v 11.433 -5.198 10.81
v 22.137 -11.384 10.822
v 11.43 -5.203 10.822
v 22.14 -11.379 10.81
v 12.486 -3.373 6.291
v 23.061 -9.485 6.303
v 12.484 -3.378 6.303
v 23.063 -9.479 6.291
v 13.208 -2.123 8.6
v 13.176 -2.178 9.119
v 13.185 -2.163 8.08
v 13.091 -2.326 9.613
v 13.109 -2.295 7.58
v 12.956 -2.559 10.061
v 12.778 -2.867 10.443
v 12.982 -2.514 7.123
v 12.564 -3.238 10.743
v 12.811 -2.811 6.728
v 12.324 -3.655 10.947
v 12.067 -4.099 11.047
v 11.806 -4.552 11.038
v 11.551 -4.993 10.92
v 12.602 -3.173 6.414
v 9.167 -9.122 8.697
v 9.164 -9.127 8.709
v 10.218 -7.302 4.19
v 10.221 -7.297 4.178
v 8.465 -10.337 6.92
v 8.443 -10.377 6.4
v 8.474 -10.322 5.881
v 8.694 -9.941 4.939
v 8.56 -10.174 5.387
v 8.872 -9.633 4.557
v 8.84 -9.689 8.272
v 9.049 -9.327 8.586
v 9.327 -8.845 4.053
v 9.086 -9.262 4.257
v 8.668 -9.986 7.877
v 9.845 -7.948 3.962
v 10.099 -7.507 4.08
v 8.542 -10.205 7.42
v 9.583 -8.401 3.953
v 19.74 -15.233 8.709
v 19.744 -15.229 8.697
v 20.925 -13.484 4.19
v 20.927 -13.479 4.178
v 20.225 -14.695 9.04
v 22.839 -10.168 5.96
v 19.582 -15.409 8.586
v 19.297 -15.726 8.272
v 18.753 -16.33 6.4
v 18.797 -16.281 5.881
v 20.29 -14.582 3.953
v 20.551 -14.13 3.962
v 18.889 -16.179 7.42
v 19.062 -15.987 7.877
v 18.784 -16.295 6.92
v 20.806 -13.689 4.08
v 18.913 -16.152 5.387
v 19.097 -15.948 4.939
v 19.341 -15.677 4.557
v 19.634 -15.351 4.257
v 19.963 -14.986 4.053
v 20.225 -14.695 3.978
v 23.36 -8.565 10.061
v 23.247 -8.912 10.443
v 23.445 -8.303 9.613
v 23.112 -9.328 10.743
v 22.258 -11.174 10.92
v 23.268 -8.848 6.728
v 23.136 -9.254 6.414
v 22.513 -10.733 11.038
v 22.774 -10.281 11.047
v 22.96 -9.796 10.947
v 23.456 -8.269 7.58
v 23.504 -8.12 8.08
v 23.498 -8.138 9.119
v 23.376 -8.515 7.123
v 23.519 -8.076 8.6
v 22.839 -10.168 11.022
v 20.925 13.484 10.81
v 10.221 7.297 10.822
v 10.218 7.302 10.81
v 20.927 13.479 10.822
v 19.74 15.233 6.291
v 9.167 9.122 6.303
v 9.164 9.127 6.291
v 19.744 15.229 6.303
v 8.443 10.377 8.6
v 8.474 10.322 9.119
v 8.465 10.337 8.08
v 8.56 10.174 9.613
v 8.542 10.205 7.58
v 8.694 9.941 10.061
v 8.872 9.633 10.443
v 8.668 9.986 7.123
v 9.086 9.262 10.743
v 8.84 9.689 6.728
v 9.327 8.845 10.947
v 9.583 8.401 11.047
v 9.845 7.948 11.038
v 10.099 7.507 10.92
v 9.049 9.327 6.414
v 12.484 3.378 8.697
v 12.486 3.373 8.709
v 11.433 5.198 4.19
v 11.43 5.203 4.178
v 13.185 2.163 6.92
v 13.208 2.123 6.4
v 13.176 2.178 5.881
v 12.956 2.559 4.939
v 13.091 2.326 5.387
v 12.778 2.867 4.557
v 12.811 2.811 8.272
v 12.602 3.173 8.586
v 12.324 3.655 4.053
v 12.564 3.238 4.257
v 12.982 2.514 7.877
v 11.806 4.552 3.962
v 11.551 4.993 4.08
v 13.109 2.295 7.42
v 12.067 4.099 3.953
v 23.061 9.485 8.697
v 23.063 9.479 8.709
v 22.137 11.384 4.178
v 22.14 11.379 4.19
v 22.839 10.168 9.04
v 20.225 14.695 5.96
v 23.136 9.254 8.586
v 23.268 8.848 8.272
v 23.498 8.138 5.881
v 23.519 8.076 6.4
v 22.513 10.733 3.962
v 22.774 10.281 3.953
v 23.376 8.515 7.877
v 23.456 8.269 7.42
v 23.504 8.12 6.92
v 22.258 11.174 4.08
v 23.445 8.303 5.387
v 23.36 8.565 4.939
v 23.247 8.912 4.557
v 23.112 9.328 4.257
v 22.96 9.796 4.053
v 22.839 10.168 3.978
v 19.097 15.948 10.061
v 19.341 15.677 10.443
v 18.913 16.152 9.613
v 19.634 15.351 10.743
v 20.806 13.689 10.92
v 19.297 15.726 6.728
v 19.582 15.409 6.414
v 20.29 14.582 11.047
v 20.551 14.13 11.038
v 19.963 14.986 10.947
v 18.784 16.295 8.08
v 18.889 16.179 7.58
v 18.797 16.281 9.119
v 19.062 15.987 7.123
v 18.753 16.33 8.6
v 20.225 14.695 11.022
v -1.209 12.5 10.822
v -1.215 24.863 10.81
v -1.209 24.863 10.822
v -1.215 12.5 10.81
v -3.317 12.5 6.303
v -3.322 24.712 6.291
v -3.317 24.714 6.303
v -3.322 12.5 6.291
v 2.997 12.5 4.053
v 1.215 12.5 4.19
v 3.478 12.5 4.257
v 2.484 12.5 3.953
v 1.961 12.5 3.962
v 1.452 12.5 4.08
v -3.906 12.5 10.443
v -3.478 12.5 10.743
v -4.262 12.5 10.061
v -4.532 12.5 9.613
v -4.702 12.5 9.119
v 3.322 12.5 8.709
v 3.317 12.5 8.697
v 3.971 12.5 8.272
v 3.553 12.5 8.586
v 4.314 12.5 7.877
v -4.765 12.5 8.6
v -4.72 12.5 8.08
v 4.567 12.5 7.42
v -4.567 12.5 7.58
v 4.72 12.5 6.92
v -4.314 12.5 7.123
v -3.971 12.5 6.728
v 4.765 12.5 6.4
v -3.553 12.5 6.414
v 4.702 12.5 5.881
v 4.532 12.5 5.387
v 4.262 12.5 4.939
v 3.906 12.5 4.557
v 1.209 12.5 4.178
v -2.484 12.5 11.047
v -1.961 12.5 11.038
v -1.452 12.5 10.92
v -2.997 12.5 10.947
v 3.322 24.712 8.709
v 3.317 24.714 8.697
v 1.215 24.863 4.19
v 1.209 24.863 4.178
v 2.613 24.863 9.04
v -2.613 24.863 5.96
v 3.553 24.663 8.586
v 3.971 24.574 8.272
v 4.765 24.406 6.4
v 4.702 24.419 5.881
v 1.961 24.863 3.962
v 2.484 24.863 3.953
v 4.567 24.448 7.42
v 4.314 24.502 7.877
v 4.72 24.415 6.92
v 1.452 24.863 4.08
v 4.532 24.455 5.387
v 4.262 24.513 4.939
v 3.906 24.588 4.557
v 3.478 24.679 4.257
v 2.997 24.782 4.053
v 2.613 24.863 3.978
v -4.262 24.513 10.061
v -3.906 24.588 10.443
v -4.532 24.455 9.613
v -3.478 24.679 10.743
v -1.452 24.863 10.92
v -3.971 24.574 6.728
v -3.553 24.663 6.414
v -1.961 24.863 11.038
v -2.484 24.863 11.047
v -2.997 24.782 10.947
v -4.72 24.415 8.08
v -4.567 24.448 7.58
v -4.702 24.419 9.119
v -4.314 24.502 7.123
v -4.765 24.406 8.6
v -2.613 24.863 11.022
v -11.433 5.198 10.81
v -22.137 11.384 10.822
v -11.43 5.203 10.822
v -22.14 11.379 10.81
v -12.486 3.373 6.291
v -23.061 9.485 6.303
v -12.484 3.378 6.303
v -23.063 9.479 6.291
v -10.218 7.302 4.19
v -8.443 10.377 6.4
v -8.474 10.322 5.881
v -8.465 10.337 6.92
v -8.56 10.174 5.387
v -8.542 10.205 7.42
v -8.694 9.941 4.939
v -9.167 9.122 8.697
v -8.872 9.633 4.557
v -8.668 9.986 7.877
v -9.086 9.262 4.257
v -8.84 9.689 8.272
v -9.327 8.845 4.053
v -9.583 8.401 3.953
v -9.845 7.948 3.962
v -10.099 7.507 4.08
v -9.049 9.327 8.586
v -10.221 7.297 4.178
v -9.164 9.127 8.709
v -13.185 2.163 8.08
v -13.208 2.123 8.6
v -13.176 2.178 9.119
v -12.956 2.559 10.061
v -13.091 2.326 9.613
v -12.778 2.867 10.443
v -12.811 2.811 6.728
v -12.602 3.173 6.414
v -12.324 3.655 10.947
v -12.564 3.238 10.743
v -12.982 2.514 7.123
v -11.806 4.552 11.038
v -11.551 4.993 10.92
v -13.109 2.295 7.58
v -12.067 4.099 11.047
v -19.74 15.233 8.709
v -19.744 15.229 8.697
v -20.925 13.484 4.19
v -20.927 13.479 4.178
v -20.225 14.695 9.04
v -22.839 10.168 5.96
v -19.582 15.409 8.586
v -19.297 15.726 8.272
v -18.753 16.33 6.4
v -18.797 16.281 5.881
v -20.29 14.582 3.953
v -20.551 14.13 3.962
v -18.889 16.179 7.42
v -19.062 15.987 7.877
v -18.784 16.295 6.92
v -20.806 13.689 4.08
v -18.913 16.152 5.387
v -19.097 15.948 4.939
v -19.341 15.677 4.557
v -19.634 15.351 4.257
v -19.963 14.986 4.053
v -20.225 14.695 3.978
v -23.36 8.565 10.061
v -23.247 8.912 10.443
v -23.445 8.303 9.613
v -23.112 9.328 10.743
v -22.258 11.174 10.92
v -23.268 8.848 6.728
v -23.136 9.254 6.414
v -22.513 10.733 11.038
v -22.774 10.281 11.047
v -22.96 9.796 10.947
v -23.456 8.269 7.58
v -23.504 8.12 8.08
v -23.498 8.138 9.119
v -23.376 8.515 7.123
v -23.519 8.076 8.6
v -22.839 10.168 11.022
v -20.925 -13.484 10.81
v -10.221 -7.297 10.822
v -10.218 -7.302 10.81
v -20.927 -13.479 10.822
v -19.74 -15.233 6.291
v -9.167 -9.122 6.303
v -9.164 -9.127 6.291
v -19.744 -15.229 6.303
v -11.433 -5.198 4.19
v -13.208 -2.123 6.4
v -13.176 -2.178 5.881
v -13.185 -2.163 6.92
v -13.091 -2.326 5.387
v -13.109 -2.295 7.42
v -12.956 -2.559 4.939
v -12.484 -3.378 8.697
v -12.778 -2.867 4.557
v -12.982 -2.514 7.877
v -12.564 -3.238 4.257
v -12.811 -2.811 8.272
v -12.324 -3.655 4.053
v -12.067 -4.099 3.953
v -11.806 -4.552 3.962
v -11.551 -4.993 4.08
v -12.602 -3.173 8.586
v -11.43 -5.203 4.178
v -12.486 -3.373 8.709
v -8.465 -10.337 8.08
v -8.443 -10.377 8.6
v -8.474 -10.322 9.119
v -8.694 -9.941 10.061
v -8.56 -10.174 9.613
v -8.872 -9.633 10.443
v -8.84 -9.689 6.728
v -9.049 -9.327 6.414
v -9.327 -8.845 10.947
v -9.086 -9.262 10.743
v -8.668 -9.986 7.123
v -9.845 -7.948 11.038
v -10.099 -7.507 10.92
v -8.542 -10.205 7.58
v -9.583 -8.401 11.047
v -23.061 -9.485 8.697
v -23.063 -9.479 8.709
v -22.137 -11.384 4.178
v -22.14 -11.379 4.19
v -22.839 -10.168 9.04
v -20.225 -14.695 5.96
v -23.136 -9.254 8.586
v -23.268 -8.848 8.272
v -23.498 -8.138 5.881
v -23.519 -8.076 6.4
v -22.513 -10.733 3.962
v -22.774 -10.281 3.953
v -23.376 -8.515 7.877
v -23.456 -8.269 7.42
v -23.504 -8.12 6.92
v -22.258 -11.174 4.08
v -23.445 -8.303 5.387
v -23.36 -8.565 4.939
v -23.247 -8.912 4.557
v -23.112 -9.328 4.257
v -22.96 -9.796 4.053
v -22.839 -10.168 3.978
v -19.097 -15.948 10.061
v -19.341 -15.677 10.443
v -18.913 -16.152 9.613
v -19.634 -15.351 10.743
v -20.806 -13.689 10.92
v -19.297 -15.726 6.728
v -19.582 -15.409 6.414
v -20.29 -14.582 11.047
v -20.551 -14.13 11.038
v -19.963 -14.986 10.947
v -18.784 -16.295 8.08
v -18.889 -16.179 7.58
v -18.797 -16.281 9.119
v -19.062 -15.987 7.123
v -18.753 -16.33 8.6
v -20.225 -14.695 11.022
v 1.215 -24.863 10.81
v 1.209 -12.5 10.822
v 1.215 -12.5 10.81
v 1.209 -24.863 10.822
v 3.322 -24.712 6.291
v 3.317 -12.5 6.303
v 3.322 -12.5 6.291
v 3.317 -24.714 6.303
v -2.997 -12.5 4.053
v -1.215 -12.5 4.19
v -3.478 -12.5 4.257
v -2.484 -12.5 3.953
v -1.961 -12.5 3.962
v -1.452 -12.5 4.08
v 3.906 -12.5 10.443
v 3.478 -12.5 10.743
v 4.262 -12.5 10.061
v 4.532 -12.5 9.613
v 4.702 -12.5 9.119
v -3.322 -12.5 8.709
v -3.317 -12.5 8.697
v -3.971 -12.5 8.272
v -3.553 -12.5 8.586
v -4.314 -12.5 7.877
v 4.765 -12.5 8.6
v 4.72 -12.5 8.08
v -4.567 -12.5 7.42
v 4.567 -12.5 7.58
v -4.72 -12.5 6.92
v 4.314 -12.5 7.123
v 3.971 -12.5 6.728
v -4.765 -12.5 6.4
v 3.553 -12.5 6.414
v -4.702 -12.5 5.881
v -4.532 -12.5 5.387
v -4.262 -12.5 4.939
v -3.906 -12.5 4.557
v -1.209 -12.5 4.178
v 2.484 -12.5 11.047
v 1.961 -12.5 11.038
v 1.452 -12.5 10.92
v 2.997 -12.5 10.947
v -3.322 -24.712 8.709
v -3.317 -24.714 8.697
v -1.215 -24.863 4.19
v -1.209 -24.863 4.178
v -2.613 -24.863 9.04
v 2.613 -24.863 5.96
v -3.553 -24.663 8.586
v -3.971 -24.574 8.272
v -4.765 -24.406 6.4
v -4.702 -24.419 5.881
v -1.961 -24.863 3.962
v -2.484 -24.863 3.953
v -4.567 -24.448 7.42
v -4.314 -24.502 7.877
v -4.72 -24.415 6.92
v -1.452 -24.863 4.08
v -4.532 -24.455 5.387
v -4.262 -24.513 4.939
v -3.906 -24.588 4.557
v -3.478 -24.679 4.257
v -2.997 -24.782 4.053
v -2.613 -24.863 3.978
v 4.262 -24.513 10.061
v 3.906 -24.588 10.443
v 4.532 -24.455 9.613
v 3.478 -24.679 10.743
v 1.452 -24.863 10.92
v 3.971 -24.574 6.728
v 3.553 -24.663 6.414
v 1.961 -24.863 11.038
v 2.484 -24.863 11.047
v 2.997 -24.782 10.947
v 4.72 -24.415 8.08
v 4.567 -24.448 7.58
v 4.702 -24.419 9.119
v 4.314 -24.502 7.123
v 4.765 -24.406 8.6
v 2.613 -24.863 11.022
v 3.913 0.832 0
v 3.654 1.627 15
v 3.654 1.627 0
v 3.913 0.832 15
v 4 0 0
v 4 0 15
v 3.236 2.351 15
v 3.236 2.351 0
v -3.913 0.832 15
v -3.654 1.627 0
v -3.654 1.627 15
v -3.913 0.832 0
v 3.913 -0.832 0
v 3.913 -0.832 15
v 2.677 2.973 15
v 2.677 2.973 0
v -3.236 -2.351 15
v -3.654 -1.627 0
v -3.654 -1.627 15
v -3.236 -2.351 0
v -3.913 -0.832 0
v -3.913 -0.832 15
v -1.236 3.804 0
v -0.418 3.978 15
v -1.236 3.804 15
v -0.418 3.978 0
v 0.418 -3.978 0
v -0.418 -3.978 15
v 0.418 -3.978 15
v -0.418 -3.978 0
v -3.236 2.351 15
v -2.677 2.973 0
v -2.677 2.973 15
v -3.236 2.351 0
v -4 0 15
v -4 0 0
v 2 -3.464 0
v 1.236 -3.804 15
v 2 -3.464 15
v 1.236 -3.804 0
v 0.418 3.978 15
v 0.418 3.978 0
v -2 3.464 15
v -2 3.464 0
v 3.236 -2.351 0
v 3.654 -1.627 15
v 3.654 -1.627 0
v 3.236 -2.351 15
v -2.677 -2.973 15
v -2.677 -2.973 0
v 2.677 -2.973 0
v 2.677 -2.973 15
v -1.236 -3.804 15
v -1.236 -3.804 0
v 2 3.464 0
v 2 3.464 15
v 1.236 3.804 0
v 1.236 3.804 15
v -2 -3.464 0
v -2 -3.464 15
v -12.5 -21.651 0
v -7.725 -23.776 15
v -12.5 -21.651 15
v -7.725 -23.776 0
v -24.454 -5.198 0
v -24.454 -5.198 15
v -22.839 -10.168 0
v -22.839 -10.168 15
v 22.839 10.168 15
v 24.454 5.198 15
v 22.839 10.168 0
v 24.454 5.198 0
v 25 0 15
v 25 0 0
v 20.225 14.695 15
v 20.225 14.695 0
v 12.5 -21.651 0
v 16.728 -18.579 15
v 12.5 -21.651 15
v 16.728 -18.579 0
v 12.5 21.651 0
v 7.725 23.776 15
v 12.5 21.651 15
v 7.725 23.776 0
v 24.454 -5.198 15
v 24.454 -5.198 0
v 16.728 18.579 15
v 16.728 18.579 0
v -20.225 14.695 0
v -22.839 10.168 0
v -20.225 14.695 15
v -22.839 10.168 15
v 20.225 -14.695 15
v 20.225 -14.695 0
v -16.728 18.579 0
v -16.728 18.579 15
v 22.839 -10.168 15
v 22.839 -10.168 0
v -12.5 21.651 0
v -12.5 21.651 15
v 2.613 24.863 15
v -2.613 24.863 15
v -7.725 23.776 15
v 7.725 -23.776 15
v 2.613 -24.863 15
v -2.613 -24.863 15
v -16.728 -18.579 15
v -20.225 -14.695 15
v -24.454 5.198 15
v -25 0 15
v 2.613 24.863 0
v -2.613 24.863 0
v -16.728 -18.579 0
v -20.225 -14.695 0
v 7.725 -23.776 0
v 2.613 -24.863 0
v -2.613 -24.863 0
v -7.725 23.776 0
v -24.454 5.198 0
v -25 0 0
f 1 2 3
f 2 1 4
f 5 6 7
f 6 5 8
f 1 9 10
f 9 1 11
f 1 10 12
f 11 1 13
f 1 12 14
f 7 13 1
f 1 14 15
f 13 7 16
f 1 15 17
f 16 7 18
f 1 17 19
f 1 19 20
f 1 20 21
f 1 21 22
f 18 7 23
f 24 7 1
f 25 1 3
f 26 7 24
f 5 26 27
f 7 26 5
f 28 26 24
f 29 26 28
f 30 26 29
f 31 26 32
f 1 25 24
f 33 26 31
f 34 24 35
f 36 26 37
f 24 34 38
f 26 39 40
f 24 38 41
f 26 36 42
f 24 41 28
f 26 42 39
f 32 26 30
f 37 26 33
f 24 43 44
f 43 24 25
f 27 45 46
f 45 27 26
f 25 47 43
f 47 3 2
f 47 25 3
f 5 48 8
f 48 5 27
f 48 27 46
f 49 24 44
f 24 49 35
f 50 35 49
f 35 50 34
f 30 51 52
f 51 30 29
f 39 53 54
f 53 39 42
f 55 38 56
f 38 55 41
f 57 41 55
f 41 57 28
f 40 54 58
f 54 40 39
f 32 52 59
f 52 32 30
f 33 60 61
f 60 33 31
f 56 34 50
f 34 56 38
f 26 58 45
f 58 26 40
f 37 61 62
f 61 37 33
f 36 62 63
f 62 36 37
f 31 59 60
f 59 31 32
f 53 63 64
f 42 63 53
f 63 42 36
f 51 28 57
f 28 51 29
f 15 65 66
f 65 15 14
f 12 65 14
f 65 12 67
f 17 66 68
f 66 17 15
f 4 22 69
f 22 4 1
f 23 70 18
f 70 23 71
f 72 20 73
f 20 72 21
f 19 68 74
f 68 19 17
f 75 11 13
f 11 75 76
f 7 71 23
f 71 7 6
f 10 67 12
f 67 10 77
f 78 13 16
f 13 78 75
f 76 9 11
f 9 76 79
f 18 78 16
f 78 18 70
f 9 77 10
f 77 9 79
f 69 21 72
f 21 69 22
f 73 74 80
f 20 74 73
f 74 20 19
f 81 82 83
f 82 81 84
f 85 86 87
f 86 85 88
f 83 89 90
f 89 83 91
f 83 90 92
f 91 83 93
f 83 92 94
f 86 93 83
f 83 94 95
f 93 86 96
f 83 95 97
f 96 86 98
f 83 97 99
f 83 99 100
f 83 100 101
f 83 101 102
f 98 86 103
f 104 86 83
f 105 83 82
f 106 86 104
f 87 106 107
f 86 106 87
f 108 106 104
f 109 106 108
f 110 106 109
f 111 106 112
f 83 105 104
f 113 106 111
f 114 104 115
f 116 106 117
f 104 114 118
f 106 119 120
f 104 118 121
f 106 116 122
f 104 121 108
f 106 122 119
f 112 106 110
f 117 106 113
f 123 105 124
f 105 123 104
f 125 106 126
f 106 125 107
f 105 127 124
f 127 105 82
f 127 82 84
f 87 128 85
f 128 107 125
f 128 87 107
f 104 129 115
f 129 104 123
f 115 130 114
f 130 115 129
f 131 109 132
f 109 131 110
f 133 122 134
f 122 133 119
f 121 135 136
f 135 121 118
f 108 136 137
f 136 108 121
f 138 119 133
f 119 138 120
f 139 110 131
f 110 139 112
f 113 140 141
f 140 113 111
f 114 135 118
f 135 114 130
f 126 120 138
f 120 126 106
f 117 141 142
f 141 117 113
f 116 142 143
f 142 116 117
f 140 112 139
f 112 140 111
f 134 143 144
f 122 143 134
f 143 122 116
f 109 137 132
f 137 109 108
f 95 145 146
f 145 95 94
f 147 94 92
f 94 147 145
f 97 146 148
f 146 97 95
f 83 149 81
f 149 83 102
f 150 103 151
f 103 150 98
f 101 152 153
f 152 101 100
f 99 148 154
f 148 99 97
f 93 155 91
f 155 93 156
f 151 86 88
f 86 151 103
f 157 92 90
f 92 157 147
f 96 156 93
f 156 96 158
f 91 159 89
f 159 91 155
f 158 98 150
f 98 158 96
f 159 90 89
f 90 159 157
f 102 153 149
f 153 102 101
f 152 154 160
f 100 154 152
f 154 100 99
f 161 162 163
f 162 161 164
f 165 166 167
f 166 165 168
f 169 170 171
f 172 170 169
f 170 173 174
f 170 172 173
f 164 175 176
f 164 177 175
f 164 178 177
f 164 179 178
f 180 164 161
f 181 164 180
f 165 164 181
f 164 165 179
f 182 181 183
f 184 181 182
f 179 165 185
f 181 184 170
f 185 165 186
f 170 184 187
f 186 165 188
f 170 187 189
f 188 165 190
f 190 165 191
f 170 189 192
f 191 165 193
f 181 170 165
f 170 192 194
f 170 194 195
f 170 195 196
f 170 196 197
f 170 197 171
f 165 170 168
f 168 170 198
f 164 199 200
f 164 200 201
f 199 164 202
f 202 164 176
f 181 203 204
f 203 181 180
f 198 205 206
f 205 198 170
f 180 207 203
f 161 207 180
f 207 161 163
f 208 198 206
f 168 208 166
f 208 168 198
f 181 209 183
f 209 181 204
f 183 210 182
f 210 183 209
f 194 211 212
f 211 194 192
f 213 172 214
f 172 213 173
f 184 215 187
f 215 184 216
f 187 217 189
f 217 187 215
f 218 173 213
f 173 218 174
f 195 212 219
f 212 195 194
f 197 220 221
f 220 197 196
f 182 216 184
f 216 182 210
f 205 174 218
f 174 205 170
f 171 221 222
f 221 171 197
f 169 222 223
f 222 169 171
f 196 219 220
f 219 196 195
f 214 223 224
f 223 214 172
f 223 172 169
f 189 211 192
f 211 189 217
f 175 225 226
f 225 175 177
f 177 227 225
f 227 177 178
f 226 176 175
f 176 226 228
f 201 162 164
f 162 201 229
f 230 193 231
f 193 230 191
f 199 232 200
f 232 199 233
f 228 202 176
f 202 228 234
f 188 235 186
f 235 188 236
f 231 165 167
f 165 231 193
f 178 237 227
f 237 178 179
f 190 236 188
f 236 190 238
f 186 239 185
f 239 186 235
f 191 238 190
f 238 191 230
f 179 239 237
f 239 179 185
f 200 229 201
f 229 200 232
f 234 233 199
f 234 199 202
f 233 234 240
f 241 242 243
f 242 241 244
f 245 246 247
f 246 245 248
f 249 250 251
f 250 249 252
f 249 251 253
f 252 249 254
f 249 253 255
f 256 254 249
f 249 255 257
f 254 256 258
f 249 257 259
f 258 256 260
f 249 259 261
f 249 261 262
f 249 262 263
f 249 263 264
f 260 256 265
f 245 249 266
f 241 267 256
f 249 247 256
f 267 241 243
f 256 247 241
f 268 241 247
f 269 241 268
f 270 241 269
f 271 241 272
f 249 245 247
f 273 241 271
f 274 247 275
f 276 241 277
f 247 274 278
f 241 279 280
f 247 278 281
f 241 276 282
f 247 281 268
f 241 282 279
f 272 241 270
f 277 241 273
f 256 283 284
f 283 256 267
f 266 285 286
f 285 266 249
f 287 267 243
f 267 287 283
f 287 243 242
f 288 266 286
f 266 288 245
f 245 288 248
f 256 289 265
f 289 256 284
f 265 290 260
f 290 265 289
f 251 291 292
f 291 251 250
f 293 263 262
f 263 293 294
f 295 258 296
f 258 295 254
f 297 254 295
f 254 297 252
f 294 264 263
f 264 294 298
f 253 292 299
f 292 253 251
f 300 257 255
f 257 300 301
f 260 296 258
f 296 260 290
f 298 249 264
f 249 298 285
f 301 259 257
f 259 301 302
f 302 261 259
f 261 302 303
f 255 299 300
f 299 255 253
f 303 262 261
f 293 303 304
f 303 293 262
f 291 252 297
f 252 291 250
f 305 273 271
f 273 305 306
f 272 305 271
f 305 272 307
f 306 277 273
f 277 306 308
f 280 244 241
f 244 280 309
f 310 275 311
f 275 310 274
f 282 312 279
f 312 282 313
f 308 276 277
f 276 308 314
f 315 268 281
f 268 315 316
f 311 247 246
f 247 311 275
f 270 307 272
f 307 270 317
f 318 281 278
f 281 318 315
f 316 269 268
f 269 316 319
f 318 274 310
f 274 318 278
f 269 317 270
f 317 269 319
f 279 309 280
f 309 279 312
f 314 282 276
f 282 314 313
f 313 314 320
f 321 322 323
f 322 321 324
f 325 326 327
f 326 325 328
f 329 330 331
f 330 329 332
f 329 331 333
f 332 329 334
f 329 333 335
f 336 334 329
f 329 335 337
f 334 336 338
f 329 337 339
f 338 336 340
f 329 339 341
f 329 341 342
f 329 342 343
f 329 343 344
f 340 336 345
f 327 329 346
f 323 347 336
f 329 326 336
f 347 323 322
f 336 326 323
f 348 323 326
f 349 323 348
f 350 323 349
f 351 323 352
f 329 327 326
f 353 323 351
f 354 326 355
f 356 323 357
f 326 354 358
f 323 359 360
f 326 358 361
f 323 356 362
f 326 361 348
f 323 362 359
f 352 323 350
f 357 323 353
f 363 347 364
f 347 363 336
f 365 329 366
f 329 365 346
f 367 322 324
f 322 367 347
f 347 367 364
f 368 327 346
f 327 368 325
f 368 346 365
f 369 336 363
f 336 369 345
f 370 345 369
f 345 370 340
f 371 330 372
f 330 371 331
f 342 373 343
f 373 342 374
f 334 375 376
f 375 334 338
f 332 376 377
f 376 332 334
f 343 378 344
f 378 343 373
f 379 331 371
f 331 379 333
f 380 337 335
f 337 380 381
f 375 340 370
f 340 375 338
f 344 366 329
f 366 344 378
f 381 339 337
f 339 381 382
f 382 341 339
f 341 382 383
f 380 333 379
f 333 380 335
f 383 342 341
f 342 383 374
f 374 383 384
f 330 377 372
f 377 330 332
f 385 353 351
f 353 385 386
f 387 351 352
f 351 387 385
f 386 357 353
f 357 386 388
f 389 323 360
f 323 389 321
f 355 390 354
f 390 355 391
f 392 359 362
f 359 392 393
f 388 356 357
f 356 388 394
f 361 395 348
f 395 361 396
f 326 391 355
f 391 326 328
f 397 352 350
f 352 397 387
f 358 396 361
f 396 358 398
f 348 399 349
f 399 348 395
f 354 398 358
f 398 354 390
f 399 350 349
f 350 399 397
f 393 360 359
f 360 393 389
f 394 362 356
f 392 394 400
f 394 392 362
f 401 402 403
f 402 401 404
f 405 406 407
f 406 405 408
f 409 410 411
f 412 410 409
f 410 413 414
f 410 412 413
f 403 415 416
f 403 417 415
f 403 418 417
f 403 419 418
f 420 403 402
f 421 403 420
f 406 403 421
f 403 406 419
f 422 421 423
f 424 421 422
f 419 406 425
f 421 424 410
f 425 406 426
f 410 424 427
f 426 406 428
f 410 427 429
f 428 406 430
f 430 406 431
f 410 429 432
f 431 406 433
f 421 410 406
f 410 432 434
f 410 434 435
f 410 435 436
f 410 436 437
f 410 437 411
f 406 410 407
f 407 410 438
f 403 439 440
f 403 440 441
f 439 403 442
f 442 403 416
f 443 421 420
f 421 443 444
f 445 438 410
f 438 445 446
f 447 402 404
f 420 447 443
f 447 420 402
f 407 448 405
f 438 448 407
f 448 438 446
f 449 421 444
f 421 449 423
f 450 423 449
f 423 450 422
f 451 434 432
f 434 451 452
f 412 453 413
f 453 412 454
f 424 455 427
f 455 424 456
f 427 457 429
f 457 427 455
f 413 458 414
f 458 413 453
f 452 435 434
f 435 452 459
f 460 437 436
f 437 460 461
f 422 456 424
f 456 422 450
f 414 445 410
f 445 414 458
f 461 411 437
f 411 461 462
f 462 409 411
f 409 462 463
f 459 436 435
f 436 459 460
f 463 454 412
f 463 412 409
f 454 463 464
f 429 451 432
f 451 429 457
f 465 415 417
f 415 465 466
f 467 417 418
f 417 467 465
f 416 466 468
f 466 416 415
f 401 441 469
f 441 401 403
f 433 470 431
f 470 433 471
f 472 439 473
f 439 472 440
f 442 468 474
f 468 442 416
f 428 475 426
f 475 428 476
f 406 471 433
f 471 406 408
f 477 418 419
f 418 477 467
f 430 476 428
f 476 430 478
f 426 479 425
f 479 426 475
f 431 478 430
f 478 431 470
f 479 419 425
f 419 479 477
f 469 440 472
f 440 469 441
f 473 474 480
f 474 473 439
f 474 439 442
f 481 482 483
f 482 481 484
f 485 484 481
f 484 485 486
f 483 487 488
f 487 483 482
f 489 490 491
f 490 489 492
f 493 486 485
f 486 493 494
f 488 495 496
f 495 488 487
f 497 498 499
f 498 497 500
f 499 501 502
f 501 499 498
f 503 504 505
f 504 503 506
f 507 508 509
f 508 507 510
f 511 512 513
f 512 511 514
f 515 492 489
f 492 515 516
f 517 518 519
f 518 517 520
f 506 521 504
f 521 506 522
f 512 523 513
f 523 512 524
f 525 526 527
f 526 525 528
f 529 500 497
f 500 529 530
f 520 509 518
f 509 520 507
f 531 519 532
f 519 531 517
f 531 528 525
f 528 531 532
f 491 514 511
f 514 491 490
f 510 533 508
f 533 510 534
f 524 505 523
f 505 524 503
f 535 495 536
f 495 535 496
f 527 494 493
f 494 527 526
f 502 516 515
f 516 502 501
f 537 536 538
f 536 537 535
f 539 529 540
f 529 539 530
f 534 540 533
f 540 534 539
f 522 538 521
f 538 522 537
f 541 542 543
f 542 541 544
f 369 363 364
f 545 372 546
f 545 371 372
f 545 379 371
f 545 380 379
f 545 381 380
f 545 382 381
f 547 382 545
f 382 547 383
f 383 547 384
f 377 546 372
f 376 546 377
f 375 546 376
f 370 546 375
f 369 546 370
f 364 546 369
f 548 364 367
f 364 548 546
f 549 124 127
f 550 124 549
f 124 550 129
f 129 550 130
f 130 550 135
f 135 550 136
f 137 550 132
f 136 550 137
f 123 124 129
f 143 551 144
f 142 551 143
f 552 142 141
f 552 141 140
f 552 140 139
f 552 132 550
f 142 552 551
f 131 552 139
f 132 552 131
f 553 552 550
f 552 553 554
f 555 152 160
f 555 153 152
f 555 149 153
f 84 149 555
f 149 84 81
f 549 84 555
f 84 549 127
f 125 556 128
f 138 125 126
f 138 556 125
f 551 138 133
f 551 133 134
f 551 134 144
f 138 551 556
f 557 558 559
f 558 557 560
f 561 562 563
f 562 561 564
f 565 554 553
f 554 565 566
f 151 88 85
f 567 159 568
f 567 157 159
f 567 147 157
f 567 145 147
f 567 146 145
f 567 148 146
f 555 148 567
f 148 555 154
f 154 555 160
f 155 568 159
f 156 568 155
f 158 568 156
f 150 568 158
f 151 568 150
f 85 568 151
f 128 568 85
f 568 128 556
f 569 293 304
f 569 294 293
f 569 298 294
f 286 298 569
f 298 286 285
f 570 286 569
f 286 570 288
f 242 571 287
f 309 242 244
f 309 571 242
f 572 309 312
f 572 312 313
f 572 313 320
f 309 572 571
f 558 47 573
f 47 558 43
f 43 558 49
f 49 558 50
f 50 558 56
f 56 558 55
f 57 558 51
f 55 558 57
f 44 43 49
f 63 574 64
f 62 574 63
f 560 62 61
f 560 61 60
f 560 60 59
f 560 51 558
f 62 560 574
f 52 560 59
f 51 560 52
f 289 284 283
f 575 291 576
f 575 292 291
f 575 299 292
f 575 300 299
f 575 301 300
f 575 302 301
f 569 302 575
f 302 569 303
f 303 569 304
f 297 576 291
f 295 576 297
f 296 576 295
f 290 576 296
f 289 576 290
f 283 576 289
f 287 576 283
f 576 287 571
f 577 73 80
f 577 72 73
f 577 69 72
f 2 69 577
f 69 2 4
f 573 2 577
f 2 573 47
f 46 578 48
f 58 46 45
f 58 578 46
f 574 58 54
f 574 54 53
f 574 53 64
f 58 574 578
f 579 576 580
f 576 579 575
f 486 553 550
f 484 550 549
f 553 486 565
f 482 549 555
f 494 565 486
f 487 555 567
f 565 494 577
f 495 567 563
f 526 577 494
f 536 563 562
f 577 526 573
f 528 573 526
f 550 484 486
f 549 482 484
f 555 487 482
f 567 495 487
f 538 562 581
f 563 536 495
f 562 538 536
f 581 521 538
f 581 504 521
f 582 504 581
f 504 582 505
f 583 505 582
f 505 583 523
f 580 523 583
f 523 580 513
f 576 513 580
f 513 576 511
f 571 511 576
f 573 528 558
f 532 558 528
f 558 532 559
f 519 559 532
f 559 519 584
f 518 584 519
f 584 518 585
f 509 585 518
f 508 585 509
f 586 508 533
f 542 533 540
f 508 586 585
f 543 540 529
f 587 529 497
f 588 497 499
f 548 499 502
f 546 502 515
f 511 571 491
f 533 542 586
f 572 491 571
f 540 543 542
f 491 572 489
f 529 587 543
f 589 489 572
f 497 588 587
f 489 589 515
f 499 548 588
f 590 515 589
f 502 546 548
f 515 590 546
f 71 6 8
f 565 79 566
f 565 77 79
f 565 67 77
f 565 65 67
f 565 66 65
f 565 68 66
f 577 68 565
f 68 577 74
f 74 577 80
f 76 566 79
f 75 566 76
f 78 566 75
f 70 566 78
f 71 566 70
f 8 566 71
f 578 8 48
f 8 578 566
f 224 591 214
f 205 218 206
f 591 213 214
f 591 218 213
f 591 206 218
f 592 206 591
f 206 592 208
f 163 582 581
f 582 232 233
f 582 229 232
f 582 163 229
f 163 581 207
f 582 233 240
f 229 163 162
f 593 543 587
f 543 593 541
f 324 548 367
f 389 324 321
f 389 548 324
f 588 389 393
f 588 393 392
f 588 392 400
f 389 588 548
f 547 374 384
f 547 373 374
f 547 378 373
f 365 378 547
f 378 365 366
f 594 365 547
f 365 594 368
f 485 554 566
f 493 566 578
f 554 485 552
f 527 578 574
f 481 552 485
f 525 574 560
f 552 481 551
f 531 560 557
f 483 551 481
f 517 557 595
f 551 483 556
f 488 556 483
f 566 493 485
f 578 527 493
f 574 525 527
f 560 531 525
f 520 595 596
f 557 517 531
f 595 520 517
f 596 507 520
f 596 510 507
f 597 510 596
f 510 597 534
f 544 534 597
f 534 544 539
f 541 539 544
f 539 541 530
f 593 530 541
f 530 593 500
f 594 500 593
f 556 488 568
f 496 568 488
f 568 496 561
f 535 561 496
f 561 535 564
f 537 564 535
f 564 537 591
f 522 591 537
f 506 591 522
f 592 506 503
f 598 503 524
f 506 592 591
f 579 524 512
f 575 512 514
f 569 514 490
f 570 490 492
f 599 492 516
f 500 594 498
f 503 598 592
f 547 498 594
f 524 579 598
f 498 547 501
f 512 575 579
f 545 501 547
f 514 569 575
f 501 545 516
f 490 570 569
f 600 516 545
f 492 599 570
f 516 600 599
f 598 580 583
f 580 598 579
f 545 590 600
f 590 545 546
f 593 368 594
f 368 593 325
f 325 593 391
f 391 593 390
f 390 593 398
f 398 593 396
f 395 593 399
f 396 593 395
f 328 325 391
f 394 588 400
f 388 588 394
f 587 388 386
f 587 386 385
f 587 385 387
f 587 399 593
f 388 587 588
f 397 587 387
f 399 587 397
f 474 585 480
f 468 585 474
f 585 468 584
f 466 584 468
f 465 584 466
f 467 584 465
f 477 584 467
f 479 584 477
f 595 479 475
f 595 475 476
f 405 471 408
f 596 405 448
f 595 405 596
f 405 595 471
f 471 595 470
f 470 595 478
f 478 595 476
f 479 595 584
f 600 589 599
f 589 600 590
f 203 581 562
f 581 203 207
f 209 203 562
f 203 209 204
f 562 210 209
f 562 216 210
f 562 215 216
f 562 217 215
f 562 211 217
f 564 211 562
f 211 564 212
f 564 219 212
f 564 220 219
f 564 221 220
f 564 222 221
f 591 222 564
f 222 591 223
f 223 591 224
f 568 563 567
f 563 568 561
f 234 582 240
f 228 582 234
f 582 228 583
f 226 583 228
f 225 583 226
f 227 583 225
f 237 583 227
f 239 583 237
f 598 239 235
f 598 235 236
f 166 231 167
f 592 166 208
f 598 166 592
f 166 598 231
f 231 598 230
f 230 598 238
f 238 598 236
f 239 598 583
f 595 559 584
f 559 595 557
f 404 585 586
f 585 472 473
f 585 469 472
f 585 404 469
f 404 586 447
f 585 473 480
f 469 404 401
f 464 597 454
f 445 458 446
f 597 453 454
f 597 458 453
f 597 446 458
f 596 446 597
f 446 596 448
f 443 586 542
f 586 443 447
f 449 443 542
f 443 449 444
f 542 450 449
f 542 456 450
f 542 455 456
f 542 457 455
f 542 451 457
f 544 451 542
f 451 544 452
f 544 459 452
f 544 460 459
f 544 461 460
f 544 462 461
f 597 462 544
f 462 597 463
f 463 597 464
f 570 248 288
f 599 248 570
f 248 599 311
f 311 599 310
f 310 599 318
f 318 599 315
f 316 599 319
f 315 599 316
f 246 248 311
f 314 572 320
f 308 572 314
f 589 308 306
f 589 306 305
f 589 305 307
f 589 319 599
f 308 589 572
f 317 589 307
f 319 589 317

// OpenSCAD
// Which one would you like to see?
part = "first"; // [first:Fan Barrel,second:Fan Blades,third:Base Stem,fourth:Base]

//Resolution of the curves.(Higher = more polygons and higher load time)
$fn = 30;
numberOfBlades = 6;
// In millimeters
lengthOfBlades = 125;
// In millimeters
widthOfBlades = 30;
// In millimeters
thicknessOfBlades = 2;
// In degrees
angleOfBlades = 25;
// Height of the center cylinder
heightOfBarrel = 15;
// Diameter of the center cylinder
diameterOfBarrel = 50;

print_part();
module print_part() {
	if (part == "first") {
		fanBarrel();
	} else if (part == "second") {
		fanBlades();
	} else if (part == "third") {
		baseStem();
	} else {
		base();
	}
}


// Fan Barrel
module fanBarrel(){
    difference(){
        cylinder( d = diameterOfBarrel, h = heightOfBarrel );
        union(){
            translate([0,0,-1]){
                cylinder( d = 8, h = heightOfBarrel + 2 );
            }
            for( i = [ 1 : numberOfBlades ] ){
                rotate(a = [90, 0, i * (360/numberOfBlades)]){
                    translate([0,heightOfBarrel/2,0]){
                        rotate(a = [0,0,angleOfBlades]){
                            translate([-2.5,0,diameterOfBarrel / 4]){
                                
                                union(){
                                    translate([0,-2.5,0]){
                                        cube([5, 5, diameterOfBarrel / 4 + 2]);
                                    }
                                    cylinder( d = 5, h = diameterOfBarrel / 4 + 2 );
                                    translate([5,0,0]){
                                        cylinder( d = 5, h = diameterOfBarrel / 4 + 2 );
                                    }
                                }
                            }
                        }
                    }
                }
            }
        }
    }
}
// Fan Blades
module fanBlades(){
    union(){
        cube([lengthOfBlades,widthOfBlades,thicknessOfBlades]);
        cube([4,widthOfBlades,5]);
        translate([2,(widthOfBlades/2)-2.5,2.5]){
            union(){
                rotate(a = [0,-90,0]){ rotate([0,0,90]){
                    translate([0,-2.5,0]){
                        cube([5, 5, diameterOfBarrel / 4 + 2]);
                    }
                    cylinder( d = 5, h = diameterOfBarrel / 4 + 2 );
                    translate([5,0,0]){
                        cylinder( d = 5, h = diameterOfBarrel / 4 + 2 );
                    }
                }}
            }
        }
    }
}
// Base Stem
module baseStem(){
    union(){
        cube([lengthOfBlades * 1.3,8,8]);
        translate([lengthOfBlades * 1.3 - 4,0,0]){
            cube([4,heightOfBarrel + 50,4]);
        }
        translate([lengthOfBlades * 1.3 - 4,heightOfBarrel + 49,0]){
            cube([7,4,4]);
        }
        difference(){
            translate([lengthOfBlades * 1.3 - (100 / sqrt(2)),-40,0]){
                rotate(a = [0,0,-45]){
                    cube([4,100,4]);
                }
            }
            translate([0,-100,-1]){
                cube([lengthOfBlades * 1.3,100,10]);
            }
        }
    }
}
// Base
module base(){
    difference(){
        cube([heightOfBarrel + 68,lengthOfBlades*1.5,10]);
        translate([4,(lengthOfBlades*1.5)/2,-1]){
            cube([8,8,12]);
        }
    }
}
